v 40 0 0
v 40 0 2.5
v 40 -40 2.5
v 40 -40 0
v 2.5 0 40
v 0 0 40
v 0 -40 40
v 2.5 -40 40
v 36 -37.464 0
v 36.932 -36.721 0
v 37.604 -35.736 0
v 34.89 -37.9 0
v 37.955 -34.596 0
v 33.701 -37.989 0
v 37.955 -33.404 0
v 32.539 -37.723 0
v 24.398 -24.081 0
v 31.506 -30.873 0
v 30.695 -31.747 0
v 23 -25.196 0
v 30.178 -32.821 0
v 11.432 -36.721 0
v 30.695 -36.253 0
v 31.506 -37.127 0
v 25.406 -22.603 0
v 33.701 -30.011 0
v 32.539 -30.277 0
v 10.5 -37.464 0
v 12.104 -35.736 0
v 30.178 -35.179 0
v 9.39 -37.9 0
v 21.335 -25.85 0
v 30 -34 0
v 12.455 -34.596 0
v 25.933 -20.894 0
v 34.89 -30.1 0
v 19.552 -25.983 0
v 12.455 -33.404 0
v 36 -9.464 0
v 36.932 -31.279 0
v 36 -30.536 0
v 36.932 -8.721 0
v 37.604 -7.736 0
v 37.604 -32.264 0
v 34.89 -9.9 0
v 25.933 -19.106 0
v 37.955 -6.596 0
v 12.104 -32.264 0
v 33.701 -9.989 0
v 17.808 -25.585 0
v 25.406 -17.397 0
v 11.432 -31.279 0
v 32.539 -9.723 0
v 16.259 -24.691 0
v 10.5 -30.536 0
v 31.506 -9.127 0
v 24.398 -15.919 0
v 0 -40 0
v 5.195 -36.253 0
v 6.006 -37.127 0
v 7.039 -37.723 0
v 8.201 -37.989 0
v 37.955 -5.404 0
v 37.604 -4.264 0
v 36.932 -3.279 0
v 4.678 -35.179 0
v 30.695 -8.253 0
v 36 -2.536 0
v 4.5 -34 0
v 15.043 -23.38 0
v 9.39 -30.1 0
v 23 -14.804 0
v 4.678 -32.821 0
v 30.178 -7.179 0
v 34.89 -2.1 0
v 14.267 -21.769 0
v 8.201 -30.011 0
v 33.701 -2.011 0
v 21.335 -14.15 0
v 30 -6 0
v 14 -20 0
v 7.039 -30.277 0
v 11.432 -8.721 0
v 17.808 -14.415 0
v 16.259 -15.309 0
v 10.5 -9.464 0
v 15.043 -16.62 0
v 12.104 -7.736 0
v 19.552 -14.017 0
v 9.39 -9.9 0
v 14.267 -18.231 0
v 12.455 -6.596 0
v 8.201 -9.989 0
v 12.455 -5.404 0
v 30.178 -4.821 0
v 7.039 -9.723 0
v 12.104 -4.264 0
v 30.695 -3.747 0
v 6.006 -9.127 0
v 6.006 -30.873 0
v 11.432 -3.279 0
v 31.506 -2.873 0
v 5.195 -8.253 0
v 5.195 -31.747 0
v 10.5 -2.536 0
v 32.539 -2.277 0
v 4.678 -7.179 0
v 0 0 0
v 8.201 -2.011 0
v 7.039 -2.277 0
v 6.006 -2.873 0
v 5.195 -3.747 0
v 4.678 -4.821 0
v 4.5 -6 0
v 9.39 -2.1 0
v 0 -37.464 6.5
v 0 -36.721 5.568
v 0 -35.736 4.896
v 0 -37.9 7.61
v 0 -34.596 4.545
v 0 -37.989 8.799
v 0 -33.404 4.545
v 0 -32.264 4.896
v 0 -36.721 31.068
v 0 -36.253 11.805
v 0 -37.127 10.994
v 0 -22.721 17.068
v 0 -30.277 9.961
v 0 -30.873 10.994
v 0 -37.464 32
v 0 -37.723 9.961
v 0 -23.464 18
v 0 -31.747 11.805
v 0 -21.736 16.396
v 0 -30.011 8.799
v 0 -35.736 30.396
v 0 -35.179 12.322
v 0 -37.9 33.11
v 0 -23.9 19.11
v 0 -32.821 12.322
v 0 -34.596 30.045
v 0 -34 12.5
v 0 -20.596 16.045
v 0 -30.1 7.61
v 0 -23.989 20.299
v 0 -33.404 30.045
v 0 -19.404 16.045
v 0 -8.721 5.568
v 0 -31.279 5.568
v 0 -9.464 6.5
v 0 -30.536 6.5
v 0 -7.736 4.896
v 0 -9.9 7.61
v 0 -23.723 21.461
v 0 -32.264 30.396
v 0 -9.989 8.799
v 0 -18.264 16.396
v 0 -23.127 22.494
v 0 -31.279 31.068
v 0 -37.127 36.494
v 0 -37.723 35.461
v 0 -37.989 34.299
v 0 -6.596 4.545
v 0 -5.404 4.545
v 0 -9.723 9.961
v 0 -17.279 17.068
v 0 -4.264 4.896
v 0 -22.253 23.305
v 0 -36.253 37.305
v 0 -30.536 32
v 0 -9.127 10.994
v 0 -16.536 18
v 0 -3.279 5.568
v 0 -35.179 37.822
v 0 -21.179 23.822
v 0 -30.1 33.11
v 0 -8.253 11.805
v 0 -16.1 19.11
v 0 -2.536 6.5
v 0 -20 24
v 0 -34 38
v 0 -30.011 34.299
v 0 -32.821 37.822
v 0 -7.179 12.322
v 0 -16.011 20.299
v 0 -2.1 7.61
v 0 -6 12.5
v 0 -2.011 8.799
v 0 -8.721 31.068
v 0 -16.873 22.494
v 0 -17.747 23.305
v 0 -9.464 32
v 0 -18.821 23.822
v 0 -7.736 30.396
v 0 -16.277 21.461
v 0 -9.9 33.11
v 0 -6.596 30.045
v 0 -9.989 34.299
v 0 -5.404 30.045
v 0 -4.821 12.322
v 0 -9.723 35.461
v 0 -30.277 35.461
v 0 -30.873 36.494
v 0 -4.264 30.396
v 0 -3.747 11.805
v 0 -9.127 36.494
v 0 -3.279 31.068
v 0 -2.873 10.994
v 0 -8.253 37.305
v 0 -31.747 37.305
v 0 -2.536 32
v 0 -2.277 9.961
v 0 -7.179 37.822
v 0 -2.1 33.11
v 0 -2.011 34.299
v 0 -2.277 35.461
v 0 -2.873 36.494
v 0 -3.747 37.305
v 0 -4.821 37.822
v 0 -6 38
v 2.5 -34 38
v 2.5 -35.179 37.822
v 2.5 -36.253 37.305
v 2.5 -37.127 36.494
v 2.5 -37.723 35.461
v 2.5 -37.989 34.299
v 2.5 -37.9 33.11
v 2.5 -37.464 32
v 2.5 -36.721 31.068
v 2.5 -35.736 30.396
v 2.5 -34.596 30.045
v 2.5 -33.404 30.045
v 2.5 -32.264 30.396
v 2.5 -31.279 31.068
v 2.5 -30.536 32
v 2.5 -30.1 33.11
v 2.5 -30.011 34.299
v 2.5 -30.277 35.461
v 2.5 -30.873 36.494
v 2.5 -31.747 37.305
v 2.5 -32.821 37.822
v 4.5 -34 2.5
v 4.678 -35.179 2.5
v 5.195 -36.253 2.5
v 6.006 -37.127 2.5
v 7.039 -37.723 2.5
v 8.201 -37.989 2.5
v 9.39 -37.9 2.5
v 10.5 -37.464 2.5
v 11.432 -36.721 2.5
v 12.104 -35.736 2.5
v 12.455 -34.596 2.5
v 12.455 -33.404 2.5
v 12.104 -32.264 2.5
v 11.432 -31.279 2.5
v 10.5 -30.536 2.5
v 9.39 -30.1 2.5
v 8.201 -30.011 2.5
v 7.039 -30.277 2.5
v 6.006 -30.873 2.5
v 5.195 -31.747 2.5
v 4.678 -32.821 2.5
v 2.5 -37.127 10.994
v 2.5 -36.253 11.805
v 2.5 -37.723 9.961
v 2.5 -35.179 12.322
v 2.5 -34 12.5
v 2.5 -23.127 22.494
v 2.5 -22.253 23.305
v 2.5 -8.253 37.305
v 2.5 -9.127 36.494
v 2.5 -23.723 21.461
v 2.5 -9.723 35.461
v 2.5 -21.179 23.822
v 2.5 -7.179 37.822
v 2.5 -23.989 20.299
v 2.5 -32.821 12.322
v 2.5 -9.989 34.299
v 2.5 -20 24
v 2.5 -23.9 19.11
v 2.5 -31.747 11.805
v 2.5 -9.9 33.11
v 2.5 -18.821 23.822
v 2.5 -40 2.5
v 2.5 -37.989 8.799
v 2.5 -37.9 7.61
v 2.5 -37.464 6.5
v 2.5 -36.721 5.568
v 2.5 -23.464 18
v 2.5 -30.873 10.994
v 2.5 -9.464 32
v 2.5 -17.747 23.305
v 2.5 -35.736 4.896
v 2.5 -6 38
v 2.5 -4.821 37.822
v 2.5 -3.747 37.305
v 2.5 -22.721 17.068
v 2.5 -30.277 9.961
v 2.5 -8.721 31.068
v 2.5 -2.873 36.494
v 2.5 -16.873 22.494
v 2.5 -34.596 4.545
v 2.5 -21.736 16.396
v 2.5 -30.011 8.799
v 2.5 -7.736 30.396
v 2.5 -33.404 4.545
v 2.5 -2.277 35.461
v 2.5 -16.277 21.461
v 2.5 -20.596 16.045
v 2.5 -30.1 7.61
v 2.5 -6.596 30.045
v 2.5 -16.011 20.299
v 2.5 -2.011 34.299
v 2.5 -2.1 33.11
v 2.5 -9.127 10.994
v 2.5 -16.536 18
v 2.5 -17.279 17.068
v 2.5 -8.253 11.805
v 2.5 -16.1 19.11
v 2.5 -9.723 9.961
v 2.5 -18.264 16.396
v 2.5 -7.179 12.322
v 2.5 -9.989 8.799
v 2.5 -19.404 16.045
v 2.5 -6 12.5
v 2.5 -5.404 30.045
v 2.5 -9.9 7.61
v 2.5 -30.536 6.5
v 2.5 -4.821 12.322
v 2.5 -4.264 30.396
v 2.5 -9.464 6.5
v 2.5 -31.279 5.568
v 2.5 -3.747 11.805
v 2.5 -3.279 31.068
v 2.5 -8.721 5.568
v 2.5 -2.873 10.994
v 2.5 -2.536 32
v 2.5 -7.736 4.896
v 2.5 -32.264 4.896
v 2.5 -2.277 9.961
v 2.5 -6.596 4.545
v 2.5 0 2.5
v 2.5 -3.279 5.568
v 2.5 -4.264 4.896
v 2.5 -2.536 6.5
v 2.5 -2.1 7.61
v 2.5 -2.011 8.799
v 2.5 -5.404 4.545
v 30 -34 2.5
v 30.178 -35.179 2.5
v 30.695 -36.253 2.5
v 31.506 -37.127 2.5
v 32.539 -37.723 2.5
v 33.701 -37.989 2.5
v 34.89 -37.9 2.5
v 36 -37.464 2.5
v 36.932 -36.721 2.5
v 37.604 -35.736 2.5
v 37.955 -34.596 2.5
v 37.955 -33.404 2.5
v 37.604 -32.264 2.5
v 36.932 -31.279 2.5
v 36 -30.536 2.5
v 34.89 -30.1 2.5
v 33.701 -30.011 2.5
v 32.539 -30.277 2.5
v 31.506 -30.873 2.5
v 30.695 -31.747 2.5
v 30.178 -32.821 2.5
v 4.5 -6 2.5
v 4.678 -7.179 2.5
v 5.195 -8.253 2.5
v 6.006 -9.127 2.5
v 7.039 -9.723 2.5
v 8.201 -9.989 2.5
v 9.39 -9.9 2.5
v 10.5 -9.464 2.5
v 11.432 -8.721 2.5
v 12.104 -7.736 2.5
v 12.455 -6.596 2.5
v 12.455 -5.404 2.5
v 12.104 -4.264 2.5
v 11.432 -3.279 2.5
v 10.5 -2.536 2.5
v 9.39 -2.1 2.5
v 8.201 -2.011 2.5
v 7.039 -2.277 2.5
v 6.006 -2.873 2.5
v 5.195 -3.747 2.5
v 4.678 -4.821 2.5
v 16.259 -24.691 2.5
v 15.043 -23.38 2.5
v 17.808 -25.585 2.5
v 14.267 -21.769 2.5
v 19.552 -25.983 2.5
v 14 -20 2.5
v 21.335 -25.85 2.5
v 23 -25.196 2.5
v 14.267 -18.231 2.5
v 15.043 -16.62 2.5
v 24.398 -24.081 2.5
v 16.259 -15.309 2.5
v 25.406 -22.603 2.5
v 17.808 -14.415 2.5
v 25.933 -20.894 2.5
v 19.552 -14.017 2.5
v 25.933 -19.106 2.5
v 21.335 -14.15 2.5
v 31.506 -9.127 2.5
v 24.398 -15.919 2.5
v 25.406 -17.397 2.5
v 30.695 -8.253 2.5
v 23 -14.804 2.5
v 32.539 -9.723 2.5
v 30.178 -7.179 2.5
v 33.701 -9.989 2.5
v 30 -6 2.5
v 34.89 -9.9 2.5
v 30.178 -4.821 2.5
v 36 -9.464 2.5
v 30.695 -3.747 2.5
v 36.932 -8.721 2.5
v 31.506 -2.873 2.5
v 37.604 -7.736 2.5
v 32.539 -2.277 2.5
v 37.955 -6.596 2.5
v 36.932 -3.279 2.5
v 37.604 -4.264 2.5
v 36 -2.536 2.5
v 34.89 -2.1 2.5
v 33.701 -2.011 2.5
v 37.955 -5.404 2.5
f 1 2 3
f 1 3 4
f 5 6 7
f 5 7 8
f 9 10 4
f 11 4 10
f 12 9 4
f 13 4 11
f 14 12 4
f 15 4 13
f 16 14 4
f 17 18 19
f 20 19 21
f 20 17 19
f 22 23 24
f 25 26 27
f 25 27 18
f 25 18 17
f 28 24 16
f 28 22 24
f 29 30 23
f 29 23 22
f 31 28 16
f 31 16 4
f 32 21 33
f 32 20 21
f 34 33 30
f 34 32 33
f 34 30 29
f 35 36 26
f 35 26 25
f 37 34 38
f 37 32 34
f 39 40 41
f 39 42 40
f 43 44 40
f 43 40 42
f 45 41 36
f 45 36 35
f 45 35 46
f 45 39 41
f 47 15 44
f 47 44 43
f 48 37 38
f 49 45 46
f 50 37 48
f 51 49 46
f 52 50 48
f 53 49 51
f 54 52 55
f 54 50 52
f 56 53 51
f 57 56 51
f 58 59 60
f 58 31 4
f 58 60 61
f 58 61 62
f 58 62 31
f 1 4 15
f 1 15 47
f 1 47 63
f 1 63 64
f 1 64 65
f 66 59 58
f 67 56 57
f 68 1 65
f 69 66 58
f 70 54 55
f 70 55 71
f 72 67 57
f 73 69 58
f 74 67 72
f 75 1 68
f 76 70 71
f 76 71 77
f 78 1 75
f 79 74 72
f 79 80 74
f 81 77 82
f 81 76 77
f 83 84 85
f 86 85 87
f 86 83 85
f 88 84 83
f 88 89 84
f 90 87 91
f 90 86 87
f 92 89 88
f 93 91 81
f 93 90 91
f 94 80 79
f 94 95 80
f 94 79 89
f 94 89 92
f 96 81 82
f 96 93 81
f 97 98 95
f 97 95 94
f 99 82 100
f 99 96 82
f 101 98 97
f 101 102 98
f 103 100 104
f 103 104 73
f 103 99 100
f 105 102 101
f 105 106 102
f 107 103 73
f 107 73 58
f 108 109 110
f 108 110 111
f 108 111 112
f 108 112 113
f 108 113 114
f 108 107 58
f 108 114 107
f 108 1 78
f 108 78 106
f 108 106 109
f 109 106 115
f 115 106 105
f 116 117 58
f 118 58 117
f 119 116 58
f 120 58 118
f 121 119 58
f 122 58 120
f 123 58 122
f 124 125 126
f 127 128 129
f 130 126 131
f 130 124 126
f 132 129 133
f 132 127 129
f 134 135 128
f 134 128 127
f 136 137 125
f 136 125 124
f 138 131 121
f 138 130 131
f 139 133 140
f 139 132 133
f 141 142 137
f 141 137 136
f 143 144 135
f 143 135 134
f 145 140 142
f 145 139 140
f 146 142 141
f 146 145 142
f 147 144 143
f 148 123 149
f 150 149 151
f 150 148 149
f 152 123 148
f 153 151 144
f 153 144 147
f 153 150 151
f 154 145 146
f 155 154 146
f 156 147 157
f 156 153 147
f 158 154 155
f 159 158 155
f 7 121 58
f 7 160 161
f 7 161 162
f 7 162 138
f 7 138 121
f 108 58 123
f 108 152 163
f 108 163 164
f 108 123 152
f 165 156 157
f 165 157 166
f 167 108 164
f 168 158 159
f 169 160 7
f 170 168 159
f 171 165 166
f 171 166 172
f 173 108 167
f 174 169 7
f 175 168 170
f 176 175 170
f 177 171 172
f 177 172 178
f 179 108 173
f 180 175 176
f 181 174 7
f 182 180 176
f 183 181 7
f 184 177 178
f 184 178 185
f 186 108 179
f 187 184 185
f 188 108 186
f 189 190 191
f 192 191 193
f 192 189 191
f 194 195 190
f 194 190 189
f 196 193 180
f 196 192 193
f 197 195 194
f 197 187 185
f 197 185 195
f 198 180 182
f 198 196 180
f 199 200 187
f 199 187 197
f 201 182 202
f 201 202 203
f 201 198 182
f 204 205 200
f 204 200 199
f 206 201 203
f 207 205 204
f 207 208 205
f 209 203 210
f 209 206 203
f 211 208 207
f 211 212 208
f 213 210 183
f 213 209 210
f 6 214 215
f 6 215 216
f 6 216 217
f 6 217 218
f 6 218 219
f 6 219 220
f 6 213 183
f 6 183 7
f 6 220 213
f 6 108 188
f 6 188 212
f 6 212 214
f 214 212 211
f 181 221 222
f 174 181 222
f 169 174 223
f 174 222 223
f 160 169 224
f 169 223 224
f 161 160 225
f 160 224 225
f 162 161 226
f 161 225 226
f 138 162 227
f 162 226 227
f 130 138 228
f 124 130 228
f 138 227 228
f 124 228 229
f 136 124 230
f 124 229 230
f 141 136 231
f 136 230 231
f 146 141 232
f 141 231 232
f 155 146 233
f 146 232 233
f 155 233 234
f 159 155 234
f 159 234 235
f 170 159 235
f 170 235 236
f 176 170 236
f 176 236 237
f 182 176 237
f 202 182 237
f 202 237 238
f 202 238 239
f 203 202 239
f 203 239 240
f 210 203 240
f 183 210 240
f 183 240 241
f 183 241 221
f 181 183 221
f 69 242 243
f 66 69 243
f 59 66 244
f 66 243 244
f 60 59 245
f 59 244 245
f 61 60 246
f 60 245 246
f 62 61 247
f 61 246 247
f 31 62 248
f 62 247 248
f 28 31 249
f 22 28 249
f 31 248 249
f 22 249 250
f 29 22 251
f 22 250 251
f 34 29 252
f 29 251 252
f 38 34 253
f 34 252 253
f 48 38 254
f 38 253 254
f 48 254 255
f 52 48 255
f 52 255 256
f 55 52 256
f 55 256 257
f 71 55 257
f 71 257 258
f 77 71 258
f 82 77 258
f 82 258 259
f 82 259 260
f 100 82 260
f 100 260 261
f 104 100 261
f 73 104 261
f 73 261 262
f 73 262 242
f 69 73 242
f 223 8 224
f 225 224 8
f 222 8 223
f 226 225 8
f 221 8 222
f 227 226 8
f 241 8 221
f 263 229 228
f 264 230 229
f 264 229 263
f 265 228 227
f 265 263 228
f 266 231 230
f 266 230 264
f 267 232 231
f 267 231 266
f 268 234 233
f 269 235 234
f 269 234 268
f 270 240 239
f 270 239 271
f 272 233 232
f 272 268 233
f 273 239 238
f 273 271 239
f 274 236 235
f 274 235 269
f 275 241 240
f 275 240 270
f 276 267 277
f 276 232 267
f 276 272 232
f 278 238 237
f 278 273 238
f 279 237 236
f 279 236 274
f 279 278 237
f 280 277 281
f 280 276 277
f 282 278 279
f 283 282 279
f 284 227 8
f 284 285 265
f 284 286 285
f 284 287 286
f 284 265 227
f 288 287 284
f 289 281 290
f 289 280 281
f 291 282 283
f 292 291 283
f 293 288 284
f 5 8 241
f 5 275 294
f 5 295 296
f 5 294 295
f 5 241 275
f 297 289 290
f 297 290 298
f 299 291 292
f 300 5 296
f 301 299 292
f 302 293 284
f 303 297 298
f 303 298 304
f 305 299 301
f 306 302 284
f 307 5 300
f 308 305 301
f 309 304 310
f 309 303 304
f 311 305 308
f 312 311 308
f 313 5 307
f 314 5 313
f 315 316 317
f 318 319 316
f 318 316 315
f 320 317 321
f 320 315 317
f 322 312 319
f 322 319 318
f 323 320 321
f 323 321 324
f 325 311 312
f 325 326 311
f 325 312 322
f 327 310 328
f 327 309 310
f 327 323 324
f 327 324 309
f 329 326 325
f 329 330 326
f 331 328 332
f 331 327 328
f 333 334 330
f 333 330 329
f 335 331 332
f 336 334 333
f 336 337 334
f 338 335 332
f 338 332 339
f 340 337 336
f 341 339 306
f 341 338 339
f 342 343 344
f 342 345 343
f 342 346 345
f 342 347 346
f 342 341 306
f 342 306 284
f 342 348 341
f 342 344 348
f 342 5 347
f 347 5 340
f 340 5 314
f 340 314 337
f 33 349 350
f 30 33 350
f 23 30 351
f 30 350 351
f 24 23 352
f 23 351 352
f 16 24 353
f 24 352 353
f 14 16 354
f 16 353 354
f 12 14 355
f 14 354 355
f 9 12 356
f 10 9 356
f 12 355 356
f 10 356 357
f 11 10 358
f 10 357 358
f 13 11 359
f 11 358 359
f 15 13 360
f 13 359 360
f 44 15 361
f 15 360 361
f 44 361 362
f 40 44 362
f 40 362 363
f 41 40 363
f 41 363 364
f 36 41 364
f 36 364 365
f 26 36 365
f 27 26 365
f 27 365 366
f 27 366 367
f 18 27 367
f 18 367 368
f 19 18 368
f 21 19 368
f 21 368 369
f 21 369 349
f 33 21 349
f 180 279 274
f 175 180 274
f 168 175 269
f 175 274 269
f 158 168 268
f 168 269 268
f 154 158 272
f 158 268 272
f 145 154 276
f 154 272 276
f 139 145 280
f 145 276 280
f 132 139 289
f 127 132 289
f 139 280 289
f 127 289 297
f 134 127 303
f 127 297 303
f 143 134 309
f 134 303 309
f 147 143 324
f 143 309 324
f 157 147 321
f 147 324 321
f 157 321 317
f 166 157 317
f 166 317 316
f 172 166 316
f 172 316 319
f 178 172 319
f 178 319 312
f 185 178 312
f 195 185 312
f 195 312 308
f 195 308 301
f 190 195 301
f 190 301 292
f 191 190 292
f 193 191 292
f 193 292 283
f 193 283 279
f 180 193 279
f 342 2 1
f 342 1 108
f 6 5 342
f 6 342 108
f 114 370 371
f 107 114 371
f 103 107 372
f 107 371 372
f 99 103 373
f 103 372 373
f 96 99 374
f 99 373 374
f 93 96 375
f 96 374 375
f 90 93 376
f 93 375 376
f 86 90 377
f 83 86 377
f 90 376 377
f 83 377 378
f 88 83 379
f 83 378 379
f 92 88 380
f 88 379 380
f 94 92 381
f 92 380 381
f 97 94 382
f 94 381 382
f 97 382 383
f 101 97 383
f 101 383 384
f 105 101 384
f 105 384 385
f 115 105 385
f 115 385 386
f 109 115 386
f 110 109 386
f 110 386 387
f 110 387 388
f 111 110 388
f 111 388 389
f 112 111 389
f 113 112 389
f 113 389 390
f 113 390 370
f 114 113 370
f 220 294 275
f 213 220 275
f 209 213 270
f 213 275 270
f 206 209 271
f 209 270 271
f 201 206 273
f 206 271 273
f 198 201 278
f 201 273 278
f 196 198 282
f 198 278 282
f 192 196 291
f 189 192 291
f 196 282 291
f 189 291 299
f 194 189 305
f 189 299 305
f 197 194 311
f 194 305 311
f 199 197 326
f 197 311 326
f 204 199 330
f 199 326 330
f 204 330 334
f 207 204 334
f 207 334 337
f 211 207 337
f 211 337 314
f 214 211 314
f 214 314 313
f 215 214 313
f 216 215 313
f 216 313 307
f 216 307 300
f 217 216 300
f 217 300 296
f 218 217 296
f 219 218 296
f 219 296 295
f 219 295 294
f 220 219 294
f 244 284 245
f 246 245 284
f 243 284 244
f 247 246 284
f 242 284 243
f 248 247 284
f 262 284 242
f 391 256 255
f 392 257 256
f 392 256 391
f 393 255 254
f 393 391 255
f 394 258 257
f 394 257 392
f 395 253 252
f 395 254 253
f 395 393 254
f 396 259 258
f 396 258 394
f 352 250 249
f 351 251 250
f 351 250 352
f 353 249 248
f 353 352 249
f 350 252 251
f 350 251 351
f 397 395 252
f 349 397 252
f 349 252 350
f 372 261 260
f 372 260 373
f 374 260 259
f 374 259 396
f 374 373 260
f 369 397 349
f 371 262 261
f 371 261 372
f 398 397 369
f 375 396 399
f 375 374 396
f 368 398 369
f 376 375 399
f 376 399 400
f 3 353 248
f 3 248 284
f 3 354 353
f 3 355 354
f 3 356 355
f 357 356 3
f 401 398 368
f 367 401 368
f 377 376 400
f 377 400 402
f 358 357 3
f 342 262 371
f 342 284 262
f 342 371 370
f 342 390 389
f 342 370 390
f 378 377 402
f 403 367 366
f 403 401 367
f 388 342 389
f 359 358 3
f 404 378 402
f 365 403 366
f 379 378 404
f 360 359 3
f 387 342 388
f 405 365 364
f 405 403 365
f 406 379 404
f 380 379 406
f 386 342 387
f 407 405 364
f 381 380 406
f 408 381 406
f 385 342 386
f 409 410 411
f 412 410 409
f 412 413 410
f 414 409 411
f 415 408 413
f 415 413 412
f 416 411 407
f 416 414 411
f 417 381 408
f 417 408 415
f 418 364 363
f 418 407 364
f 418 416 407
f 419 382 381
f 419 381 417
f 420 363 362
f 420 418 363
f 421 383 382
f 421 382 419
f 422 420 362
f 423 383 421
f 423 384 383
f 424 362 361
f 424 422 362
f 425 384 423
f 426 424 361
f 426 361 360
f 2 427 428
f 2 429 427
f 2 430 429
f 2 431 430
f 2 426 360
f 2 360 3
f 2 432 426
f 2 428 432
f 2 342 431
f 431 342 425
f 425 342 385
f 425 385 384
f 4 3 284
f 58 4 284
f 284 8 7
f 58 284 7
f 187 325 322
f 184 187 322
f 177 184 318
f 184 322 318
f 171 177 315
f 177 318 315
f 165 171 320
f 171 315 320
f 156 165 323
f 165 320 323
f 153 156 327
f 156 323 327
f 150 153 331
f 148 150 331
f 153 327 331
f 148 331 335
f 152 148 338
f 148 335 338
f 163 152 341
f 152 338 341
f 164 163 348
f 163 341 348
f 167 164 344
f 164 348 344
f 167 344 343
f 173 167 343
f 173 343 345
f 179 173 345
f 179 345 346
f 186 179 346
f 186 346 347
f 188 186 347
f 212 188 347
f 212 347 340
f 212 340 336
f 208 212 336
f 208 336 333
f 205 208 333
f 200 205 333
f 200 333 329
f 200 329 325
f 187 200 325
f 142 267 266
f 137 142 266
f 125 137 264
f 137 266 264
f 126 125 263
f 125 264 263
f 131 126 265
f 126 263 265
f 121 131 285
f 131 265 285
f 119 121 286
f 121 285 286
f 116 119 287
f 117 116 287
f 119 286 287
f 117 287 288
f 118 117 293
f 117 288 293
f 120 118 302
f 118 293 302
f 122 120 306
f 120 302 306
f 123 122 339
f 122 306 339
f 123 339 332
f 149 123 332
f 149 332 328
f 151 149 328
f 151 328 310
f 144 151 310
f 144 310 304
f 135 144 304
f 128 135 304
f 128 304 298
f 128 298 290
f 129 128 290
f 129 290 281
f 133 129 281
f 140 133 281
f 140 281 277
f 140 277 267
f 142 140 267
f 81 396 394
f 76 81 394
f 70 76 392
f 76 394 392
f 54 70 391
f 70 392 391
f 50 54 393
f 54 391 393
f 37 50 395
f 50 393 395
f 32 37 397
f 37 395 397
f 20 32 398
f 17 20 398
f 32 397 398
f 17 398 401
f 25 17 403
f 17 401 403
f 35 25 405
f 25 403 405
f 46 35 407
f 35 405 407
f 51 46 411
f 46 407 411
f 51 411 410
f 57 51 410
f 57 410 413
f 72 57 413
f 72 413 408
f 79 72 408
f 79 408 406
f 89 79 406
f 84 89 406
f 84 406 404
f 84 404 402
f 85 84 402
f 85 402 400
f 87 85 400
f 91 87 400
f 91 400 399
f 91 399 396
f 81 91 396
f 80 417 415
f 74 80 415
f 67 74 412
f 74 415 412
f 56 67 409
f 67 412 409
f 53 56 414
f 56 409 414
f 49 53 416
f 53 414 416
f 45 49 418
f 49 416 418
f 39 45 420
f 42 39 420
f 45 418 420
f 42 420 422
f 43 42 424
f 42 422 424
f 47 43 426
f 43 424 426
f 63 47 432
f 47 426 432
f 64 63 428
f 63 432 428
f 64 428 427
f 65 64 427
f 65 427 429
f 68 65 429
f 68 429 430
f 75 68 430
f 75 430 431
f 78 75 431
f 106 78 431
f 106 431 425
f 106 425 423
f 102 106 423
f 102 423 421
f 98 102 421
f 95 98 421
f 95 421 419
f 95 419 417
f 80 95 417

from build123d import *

# Parameters (mm, degrees)
PAD_DEPTH       = 40
SKETCH001_R     = 4
POCKET_DEPTH    = 2.501
SKETCH002_R     = 4
SKETCH002_R_2   = 6
POCKET001_DEPTH = 2.501


with BuildPart() as part:
    # Sketch → Pad (new body)
    with BuildSketch(Plane.XZ):
        Polygon((0, 0), (0, 40), (2.5, 40), (2.5, 2.5), (40, 2.5), (40, 0), align=None)
    extrude(amount=PAD_DEPTH)

    # Sketch001 (on Face3 of Pad) → Pocket (cut, through all)
    with BuildSketch(Plane(origin=(2.5, 0, 0), x_dir=(0, 0, 1), z_dir=(1, 0, 0))):
        with Locations((8.5, 34)):
            Circle(SKETCH001_R)
        with Locations((34, 34)):
            Circle(SKETCH001_R)
        with Locations((8.5, 6)):
            Circle(SKETCH001_R)
        with Locations((34, 6)):
            Circle(SKETCH001_R)
        with Locations((20, 20)):
            Circle(SKETCH001_R)
    extrude(amount=-POCKET_DEPTH, mode=Mode.SUBTRACT)

    # Sketch002 (on Face13 of Pocket) → Pocket001 (cut, through all)
    with BuildSketch(Plane(origin=(0, 0, 2.5), x_dir=(-1, 0, 0), z_dir=(0, 0, 1))):
        with Locations((-8.5, 6)):
            Circle(SKETCH002_R)
        with Locations((-34, 6)):
            Circle(SKETCH002_R)
        with Locations((-8.5, 34)):
            Circle(SKETCH002_R)
        with Locations((-34, 34)):
            Circle(SKETCH002_R)
        with Locations((-20, 20)):
            Circle(SKETCH002_R_2)
    extrude(amount=-POCKET001_DEPTH, mode=Mode.SUBTRACT)


solid = part.part
